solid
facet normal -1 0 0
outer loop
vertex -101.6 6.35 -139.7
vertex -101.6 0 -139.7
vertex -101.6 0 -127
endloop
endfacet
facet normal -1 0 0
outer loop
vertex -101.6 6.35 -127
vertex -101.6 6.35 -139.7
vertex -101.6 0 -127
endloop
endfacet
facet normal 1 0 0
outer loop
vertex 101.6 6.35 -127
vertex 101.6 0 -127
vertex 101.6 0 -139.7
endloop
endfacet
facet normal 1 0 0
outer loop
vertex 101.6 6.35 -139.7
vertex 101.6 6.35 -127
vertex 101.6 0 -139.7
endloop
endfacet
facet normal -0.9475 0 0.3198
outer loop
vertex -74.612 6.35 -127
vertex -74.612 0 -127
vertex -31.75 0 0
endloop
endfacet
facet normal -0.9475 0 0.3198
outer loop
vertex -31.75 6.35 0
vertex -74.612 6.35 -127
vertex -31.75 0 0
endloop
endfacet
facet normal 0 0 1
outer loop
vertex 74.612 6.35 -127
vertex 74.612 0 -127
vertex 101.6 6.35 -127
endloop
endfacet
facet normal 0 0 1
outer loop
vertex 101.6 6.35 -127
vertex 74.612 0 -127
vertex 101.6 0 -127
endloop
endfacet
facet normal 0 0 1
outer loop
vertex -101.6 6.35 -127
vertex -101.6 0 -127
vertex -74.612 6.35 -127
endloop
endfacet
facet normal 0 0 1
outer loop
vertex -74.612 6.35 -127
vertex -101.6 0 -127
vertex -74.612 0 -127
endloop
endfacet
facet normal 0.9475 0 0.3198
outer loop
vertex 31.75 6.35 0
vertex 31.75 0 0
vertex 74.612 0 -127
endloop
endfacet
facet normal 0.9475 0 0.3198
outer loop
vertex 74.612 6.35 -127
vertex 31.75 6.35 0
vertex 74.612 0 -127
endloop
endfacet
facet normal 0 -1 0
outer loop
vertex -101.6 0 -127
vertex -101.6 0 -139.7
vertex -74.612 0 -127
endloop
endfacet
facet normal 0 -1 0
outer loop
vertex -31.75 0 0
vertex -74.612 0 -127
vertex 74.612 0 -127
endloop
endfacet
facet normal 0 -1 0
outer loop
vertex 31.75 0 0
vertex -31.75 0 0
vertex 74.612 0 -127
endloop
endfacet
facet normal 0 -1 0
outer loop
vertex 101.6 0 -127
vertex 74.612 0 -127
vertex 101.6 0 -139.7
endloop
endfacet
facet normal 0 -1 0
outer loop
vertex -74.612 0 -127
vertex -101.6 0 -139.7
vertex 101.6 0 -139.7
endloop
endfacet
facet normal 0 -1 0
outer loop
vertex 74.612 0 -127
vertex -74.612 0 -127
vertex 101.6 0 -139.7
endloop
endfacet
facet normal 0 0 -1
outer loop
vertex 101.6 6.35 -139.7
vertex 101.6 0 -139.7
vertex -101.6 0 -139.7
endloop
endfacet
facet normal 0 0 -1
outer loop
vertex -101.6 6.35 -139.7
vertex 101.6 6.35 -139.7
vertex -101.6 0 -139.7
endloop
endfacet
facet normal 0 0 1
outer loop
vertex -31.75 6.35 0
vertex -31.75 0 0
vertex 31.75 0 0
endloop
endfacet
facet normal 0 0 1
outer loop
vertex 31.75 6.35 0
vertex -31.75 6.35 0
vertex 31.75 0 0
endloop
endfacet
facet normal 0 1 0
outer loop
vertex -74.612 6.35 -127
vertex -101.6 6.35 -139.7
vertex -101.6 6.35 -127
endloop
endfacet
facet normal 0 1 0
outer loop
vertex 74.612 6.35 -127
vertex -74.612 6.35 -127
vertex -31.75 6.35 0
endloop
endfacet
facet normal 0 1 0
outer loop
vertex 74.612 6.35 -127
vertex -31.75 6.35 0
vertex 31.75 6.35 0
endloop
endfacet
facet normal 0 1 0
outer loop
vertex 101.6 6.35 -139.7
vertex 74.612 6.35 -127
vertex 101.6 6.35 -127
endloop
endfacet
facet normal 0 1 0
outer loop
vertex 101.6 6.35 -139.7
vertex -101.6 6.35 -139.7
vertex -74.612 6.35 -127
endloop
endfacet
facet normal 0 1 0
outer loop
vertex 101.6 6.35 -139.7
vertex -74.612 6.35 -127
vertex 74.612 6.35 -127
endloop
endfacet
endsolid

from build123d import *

# Parameters (mm, degrees)
BOSS_EXTRU_1_DEPTH = 6.35


with BuildPart() as part:
    # Esquisse1 → Boss.-Extru.1 (new body)
    with BuildSketch(Plane(origin=(0, 0, 0), x_dir=(1, 0, 0), z_dir=(0, 1, 0))):
        Polygon((-101.6, 139.7), (-101.6, 127), (-74.6125, 127), (-31.75, 0), (31.75, 0), (74.6125, 127), (101.6, 127), (101.6, 139.7), align=None)
    extrude(amount=BOSS_EXTRU_1_DEPTH)


solid = part.part
